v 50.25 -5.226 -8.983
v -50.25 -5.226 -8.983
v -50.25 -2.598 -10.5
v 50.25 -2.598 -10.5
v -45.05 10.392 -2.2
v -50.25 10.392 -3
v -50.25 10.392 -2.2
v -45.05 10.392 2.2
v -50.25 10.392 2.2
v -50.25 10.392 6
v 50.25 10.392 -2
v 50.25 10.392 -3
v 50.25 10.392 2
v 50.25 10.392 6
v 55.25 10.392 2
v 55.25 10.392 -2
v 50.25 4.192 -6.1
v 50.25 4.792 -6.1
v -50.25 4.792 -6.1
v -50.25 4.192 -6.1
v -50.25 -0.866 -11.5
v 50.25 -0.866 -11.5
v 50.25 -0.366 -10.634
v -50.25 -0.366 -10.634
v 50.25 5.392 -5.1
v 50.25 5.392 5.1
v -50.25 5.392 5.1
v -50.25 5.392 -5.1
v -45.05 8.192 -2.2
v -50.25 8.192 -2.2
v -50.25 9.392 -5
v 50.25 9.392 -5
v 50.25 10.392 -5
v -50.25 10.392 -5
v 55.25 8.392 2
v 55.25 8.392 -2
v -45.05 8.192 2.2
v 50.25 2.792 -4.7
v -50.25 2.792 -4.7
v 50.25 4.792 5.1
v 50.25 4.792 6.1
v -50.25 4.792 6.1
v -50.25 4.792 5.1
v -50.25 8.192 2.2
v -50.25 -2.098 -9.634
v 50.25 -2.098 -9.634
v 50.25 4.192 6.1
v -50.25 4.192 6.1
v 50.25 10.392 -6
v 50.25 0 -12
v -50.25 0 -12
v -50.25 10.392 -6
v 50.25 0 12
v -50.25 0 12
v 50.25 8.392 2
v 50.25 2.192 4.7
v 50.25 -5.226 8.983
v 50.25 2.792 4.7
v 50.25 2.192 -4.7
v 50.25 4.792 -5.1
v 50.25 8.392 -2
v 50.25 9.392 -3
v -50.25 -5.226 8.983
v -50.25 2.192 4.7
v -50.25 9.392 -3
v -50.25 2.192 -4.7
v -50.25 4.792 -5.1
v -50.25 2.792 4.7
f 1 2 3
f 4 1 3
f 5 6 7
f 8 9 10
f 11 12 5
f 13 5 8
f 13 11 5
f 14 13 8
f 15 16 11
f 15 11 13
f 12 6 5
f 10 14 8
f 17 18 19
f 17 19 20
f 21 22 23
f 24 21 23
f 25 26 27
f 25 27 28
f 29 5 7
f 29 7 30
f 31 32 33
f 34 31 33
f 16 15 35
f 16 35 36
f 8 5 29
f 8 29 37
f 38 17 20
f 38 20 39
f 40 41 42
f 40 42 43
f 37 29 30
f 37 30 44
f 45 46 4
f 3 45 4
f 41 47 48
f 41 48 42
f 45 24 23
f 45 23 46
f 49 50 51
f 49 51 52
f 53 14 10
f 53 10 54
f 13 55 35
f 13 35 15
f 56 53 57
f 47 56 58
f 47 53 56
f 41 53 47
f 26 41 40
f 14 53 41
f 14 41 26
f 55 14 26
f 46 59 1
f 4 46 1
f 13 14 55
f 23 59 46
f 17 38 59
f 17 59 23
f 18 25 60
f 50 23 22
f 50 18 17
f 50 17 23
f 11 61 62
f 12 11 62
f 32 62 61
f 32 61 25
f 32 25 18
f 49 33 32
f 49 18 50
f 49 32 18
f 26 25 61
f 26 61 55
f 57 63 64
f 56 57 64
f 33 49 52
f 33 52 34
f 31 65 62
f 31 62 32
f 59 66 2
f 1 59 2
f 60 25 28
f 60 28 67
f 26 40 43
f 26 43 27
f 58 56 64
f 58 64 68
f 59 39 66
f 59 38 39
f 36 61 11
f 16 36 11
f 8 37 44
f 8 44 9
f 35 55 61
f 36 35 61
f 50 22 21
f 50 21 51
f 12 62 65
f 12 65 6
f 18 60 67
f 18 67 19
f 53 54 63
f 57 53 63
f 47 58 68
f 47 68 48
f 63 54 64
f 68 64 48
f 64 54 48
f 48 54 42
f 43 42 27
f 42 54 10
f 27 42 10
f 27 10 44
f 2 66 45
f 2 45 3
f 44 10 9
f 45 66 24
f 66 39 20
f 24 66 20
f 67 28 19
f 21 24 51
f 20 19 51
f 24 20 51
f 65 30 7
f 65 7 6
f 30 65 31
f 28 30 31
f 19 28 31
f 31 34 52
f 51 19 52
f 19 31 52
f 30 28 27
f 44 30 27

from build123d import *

# Parameters (mm, degrees)
BOSS_EXTRUDE2_DEPTH = 50.25
SKETCH3_W           = 2
SKETCH3_H           = 1
CUT_EXTRUDE2_DEPTH  = 101.5
SKETCH4_W           = 4
SKETCH4_H           = 2
BOSS_EXTRUDE3_DEPTH = 5
CUT_EXTRUDE3_DEPTH  = 5.2


with BuildPart() as part:
    # LED Segment → Boss-Extrude2 (new body, symmetric)
    with BuildSketch(Plane(origin=(0, 0, 0), x_dir=(0, 0, -1), z_dir=(1, 0, 0))):
        Polygon((8.982863896, -5.225833025), (12, 0), (6, 10.392304845), (-6, 10.392304845), (-12, 0), (-8.982863896, -5.225833025), (-4.7, 2.192304845), (-4.7, 2.792304845), (-6.1, 4.192304845), (-6.1, 4.792304845), (-5.1, 4.792304845), (-5.1, 5.392304845), (5.1, 5.392304845), (5.1, 4.792304845), (6.1, 4.792304845), (6.1, 4.192304845), (4.7, 2.792304845), (4.7, 2.192304845), align=None)
    extrude(amount=BOSS_EXTRUDE2_DEPTH, both=True)

    # Sketch3 → Cut-Extrude2 (cut, through all)
    with BuildSketch(Plane(origin=(50.25, 0, 0), x_dir=(0, 0, -1), z_dir=(1, 0, 0))):
        with Locations((4, 9.892304845)):
            Rectangle(SKETCH3_W, SKETCH3_H)
        Polygon((10.5, -2.598076211), (11.5, -0.866025404), (10.633974596, -0.366025404), (9.633974596, -2.098076211), align=None)
    extrude(amount=-CUT_EXTRUDE2_DEPTH, mode=Mode.SUBTRACT)

    # Sketch4 → Boss-Extrude3 (add)
    with BuildSketch(Plane(origin=(50.25, 0, 0), x_dir=(0, 0, -1), z_dir=(1, 0, 0))):
        with Locations((0, 9.392304845)):
            Rectangle(SKETCH4_W, SKETCH4_H)
    extrude(amount=BOSS_EXTRUDE3_DEPTH)

    # Sketch5 → Cut-Extrude3 (cut)
    with BuildSketch(Plane.ZY.offset(50.25)):
        Polygon((-2.2, 10.392304845), (-2.2, 8.192304845), (2.2, 8.192304845), (2.2, 10.392304845), (2, 10.392304845), (-2, 10.392304845), align=None)
    extrude(amount=-CUT_EXTRUDE3_DEPTH, mode=Mode.SUBTRACT)


solid = part.part
